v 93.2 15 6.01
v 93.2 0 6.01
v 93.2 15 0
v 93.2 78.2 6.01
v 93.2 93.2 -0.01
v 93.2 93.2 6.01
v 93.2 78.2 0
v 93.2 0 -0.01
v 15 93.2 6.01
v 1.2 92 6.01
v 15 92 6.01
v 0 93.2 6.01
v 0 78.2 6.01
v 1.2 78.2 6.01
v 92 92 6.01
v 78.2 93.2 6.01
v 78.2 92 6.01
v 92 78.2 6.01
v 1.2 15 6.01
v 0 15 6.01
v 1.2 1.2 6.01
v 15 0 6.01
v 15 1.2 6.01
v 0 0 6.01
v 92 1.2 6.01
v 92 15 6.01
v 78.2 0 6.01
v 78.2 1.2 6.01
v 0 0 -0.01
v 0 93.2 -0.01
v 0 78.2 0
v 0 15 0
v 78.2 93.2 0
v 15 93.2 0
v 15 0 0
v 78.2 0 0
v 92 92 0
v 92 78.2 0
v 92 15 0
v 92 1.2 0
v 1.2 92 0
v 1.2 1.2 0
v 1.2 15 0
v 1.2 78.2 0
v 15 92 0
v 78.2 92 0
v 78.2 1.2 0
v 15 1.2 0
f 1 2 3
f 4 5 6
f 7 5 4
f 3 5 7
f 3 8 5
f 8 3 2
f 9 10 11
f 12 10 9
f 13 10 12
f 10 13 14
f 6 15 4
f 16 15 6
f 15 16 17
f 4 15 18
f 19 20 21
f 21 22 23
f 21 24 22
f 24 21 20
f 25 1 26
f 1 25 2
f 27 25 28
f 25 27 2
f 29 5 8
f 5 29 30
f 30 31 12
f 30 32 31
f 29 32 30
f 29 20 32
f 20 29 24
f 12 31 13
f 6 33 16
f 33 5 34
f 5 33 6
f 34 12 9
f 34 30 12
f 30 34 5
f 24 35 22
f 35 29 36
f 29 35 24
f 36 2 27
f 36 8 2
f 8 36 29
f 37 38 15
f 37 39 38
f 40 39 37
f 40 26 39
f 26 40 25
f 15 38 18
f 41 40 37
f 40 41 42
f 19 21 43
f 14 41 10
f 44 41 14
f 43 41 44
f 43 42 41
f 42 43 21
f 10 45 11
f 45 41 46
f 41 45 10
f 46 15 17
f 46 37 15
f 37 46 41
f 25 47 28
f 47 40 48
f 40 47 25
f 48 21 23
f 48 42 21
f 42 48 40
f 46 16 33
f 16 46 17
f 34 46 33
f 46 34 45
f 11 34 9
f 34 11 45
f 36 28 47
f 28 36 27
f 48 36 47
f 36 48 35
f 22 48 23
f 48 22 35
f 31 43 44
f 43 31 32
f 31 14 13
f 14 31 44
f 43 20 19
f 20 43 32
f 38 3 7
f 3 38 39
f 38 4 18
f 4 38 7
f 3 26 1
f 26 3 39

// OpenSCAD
// file: ../Base/Boxes.scad
// Fischertechnik Box Foundation
// Pre-designed Boxes

use <Constants.scad>

include <PlacementOptions.scad>

box190Width = 190;
box190Depth = 130;
box130Width = 130;
box130Depth = 95;

// Values are from an original ec3 box
topBottomDifference = 1.5;
outerHeight = 40;
baseThickness = 1.8;
innerHeight = outerHeight - baseThickness;
stackExcess = 5.7;
radius = 3.5;
wallThickness = 1.5;
tolerance = 0.2;

boxWallThickness = wallThickness;
boxBaseThickness = baseThickness;
boxWebWidth = 3.0;

// getBoxWallThickness()
// Gets the wall thickness of a Fischertechnik Box
function getBoxWallThickness() = boxWallThickness;

// getBoxUsageHeight(height = 38.2)
// Gets the usable height of a Fischertechnik box
// height = Outer height of the box from the bottom to the upper edge.
function getBoxUsageHeight(height = outerHeight) = height - baseThickness - stackExcess;

// getBoxInnerHeight()
// Gets the inner height of a Fischertechnik box, including the stack excess
function getBoxInnerHeight() = innerHeight;

// getBoxBaseThickness()
// Gets the thickness of the Fischertechnik box base.
function getBoxBaseThickness() = boxBaseThickness;

// getBoxWebWidth()
// Gets the width of a box web
function getBoxWebWidth() = boxWebWidth;

// getBox190Space()
// Gets the usable inner space of a Box 190 as an x/y-list
function getBox190Space() = [
    box190Width - 2*getBoxWallThickness() - topBottomDifference, 
    box190Depth - 2*getBoxWallThickness() - topBottomDifference ];

// RoundedCornerPlate(width, depth, height, radius)
// Creates a body plate with rounded corners for a box. Used
// also to create the complete box with the hull module.
// width = Width of the plate
// depth = depth of the plate 
// height = thickness of the plate
// radius = radius of the rounded corner
module RoundedCornerPlate(width, depth, height, radius) {
    translate([radius, radius])
    hull() {
        w = width-2*radius;
        d = depth-2*radius;
        cube([w, d, height]);
        cylinder(height, r=radius, $fn=getFragments());
        translate([w, 0])
            cylinder(height, r=radius, $fn=getFragments());
        translate([w, d])
            cylinder(height, r=radius, $fn=getFragments());
        translate([0, d])
            cylinder(height, r=radius, $fn=getFragments());
    }
}

// BoxBase(width, depth)
// Creates an empty stackable Fischertechnik compatible box
// width = Outer width of the box (190, 130, ...)
// depth = Outer depth of the box (130, 95, ...)

module BoxBase(width, depth, height=outerHeight) {    
    thinPlate = 0.01;

    innerHeight = height - baseThickness;    
    
    module Body(tolerance=tolerance) {
        hull() {
            // Bottom with tolerance to fit into the original boxes when stacked
            translate([-wallThickness+tolerance, -wallThickness+tolerance, -baseThickness])
                RoundedCornerPlate(width-topBottomDifference-2*tolerance, depth-topBottomDifference-2*tolerance, thinPlate, radius);
            
            // Top
            translate([-wallThickness-topBottomDifference/2, -wallThickness-topBottomDifference/2, innerHeight-thinPlate])
                RoundedCornerPlate(width, depth, thinPlate, radius);
         }
    }

    module Cutoff() {
        hull() {
            coWidth = width - 2*wallThickness;
            coDepth = depth - 2*wallThickness;
            
            // Bottom
            RoundedCornerPlate(coWidth-topBottomDifference, coDepth-topBottomDifference, thinPlate, radius);

            // Top
            translate([-topBottomDifference/2, -topBottomDifference/2, innerHeight+thinPlate]) 
                RoundedCornerPlate(coWidth, coDepth, thinPlate, radius);
        }
    }
    
    difference() {        
        Body();
        Cutoff();
        stackOffset = innerHeight - stackExcess;
        translate([0, 0, stackOffset + baseThickness])
            Body(tolerance=0);
    }
}

// Creates the Fischertechnik empty box 130x190 mm and places it at position 0,0
// 190x130 are the outer sizes, the inner space is slightly smaller. Use getBox190Space() to get the inner sizes.
// The box is positioned that the usable inner space is at the 0,0,0 position.

module Box190() {
    BoxBase(box190Width, box190Depth);
}

// Gets the usable inner space of a Box 130 as an x/y-list
function getBox130Space() = [
    box130Width - 2*getBoxWallThickness() - topBottomDifference, 
    box130Depth - 2*getBoxWallThickness() - topBottomDifference ];

// Creates the Fischertechnik empty box 95x130 mm and places it at position 0,0
// 190x130 are the outer sizes, the inner space is slightly smaller. Use getBox190Space() to get the inner sizes.
// The box is positioned that the usable inner space is at the 0,0,0 position.

module Box130() {
    BoxBase(box130Width, box130Depth);
}

// Creates a web at the specified box walls
// corner 0 = LowerLeft, 1 = UpperLeft, 2 = UpperRight, 3 = LowerRight
// side 0 = LeftOfCorner, 1 = RightOfCorner
// distance = Distance in mm from the corner
// boxSpace = inner width and depth of the box (default: Box 190)
// webWidth = length of the web (default is 3 mms)
// webThickness = thickness of the web (default is 1 mm)
// height = Height of the web (standard is getBoxUsageHeight())

module BoxWeb(corner, side, distance, boxSpace=getBox190Space(), webWidth=getBoxWebWidth(), webThickness=1.0, height=getBoxUsageHeight()) {
    sink = getBoxWallThickness()/2;

    width = (corner % 2 == 0) ? 
            (side == LeftOfCorner ? webWidth : webThickness) :
            (side == LeftOfCorner ? webThickness : webWidth);

    depth = (corner % 2 == 0) ? 
            (side == RightOfCorner ? webWidth : webThickness) :
            (side == RightOfCorner ? webThickness : webWidth);
    
    xDiff = corner == LowerLeft ? 
                (side == LeftOfCorner ? -sink : distance) :
            (corner == UpperLeft ?                
                (side == LeftOfCorner ? distance : -sink) :
            (corner == UpperRight ?
                (side == LeftOfCorner ? boxSpace.x-webWidth+sink : boxSpace.x-distance-webThickness) :
                (side == LeftOfCorner ? boxSpace.x-distance-webThickness: boxSpace.x-webWidth+sink)));

    yDiff = corner == LowerLeft ? 
                (side == RightOfCorner ? -sink : distance) :
            (corner == UpperLeft ?
                (side == RightOfCorner ? boxSpace.y-distance-webThickness : boxSpace.y-webWidth+sink) :
            (corner == UpperRight ?
                (side == RightOfCorner ? boxSpace.y-webWidth+sink : boxSpace.y-distance-webThickness) :
                (side == RightOfCorner ? distance : -sink)));
    
    translate([xDiff, yDiff, -getExcess()])
        cube([width, depth, height + 2*getExcess()]);
}
// file: ../Base/Rotation.scad
// Fischertechnik Box Foundation
// Geometry Helpers Rotation

include <PlacementOptions.scad>

// getRotatedSpace(space, rotation=NoRotation)
// Rotates the space dependent on the specified rotation

function getRotatedSpace(space, rotation=NoRotation) = [
    (rotation == Rotate90 || rotation == Rotate270) ? space.y : space.x,
    (rotation == Rotate90 || rotation == Rotate270) ? space.x : space.y
];

// Rotates the given space around the fixed left lower corner
// space = the space the children needs as width/depth list [width,depth]
// rotation = 0 Rotate0 degrees, 1 Rotate90 degrees, 2 Rotate180 degrees, 3 Rotate270 degrees (equivalent to -90)

module RotateFix(space, rotation=NoRotation) {
    dy = (rotation == Rotate0 || rotation == Rotate270) ? 0 :
        (rotation == Rotate90) ? space.x :
        space.y;
    dx = (rotation < Rotate180) ? 0 :
        (rotation == Rotate180) ? space.x :
        space.y;
    
    translate([dx, dy, 0])
        rotate([0, 0, rotations[rotation]])
            children();
}
// file: ../Base/Alignment.scad
// Fischertechnik Box Foundation
// Geometry Helpers Alignment

include <PlacementOptions.scad>

// getAlignedX(elementWidth, spaceWidth, align=AlignRight, offset=0)
// Gets the aligned X offset of an element with the given
// width in the given space.
// elementWidth = The width of the element to positon
// spaceWidth = The space where the element should be aligned
// align = 0 AlignLeft, 1 AlignCenter, 2 AlignRight
// offset = an optional offset from the aligned position. When
// aligned left or centered, then positive values are in X direction.
// When aligned right then positive values are in negative X direction.

function getAlignedX(elementWidth, spaceWidth, align=AlignRight, offset=0) =
    (align == AlignLeft) ?
        offset :
        ((align == AlignCenter) ?
        (spaceWidth - elementWidth)/2 + offset :
        spaceWidth - offset - elementWidth);

// getAlignedY(elementDepth, spaceDepth, align=AlignTop, offset=0)
// Gets the aligned Y offset of an element with the given
// depth in the given space.
// elementDepth = The depth of the element to positon
// spaceDepth = The space where the element should be aligned
// align = 0 AlignBottom, 1 AlignCenter, 2 AlignTop
// offset = an optional offset from the aligned position. When
// aligned bottom or centered, then positive values are in Y direction.
// When aligned top then positive values are in negative Y direction.

function getAlignedY(elementDepth, spaceDepth, align=AlignTop, offset=0) =
    (align == AlignBottom) ?
        offset :
        ((align == AlignCenter) ?
        (spaceDepth - elementDepth)/2 + offset :
        spaceDepth - offset - elementDepth);
// file: ../Base/Placement.scad
// Fischertechnik Box Foundation
// Geometry Helpers Placement

use <Constants.scad>
use <Alignment.scad>
use <Rotation.scad>
use <Boxes.scad>

include <PlacementOptions.scad>

// Place(x=0, y=0, elementSpace=[0,0], alignX=AlignLeft, alignY=AlignBottom, rotation=Rotate0, boxSpace=getBox190Space())
// Places the child at the specified position
// y = Y-Position. This is a relative position when an X aligment is specified.
// x = X-Position. This is a relative position when an Y aligment is specified.
// elementSpace = space of the element to be placed [x,y]
// alignX = -1=NoAlign, 0 AlignLeft, 1 AlignCenter, 3 AlignRight (elementSpace and boxSpace required!)
// alignY = -1=NoAlign, 2 AlignBottom, 1 AlignCenter, 4 AlignTop (elementSpace and boxSpace required!)
// rotation = 0 Rotate0 0 degrees, 1 Rotate90 90 degrees, 
// 2 Rotate180 180 degrees, 3 Rotate270 270 degrees (equivalent to -90)
// boxSpace = Inner space of the box where the placement occurs [x,y] - default is Box 190x130 inner space

module Place(x=0, y=0, elementSpace=[0,0], 
  alignX=AlignLeft, alignY=AlignBottom, 
  rotation=NoRotation, boxSpace=getBox190Space()) {

    module Position(x, y, space, rotation=Rotate0) {
        translate([x, y, 0])
            RotateFix(space, rotation)
                children();
    }

    space = getRotatedSpace(elementSpace, rotation);
    alignedX = getAlignedX(space.x, boxSpace.x, alignX, x);
    alignedY = getAlignedY(space.y, boxSpace.y, alignY, y);
    Position(alignedX, alignedY, elementSpace, rotation)
        children();
}

// Center(space=getBox130Space(), elementSpace=[0,0])
// space = Space where the children is centered. For cylinder use centered=true and no elementSpace.
// elementSpace = space of the element to be centered [x,y]

module Center(space=getBox190Space(), elementSpace=[0,0]) {
    Place(elementSpace=elementSpace, boxSpace=space, alignX=AlignCenter, alignY=AlignCenter)
        children();
}

// CenterHorizontal(width=0, y=0, offset=0, space=getBox130Space())
// width = Width of the element to be placed.
// y = Y position of the element
// offset = Offset from the center position (negative will be left of the center)
// space = Space where the element is placed

module CenterHorizontal(width=0, y=0, offset=0, space=getBox190Space()) {
    Place(x=offset, y=y, elementSpace=[width, 0], boxSpace=space, alignX=AlignCenter)
        children(0);
}

// CenterVertical(depth=0, x=0, offset=0, space=getBox130Space())
// depth = Depth of the element to be placed.
// x = X position of the element
// offset = Offset from the center position (negative will be down of the center)
// space = Space where the element is placed

module CenterVertical(depth=0, x=0, offset=0, space=getBox190Space()) {
    Place(x=x, y=offset, elementSpace=[0, depth], boxSpace=space, alignY=AlignCenter)
        children(0);
}

// getIsVertical(align)
// True if the specified alignment needs a vertical orientation for a divider (AlignRight, AlignLeft)

function getIsVertical(align) = (align == AlignRight || align == AlignLeft);

// getIsHorizontal(align)
// True if the specified alignment needs a horizontal orientation for a divider (AlignTop, AlignBottom)

function getIsHorizontal(align) = (align == AlignTop || align == AlignBottom);
// file: ../Base/Constants.scad
// Fischertechnik Box Foundation
// Constants

// Constant values necessary for multiple elements

// Base constants
dividerThickness = 1.2;
excess = 0.01;
fragments = 90;
tolerance = 0.8;

// Gets the thickness of a divider 
function getDividerThickness() = dividerThickness;

// Gets the excess that is used to merge walls into each other
function getExcess() = excess;

// Gets amount of fragments of a cylinder
function getFragments() = fragments;

// Gets the inner tolerance of a frame to each side
function getTolerance() = tolerance;


// Fischertechnik specific constants
axisDiameter = 4;
axisBottomDiameter = axisDiameter + 1;
axisTolerance = 0.2;

// Gets axis diameter of Fischertechnik axis
function getAxisDiameter() = axisDiameter;

// Gets axis diameter tolerance (subtracted for element axis)
function getAxisTolerance() = axisTolerance;

// Gets the axis diameter for standing axis
function getStandAxisDiameter() = getAxisDiameter() - getAxisTolerance();

// Gets axis bottom diameter for thicker part at the bottom
function getAxisBottomDiameter() = axisBottomDiameter;

standardEdgeDistance = 2.5;
standardWebDistance = 11.5;
standardCornerLength = 15;

// gets the standard distance to the wall of the box for dockable frames with webs
function getStandardEdgeDistance() = standardEdgeDistance;

// gets the standard distance of each web to the corner of the dockable frame
function getStandardWebDistance() = standardWebDistance;

// gets the standard length of the corner walls of a dockable frame
function getStandardCornerLength() = standardCornerLength;

tubeWallFactor = 0.8;

// gets the wall thickness of a tube.
function getTubeWallThickness() = tubeWallFactor * getDividerThickness();

smallPartsFrameHeight = 20;

// gets the frame height for docked small parts boxes.
function getSmallPartsFrameHeight() = smallPartsFrameHeight;

hubRingDiameter = 19.5;
hubRingLevelDiameter = 21;

// gets the diameter of a tube matching the inner ring of a wheel
function getHubRingDiameter() = hubRingDiameter;

// gets the diameter of a hub tube with a thicker diameter
function getHubRingLevelDiameter() = hubRingLevelDiameter;
// file: ../Base/PlacementOptions.scad
// Fischertechnik Box Foundation
// Placement Options

// Alignment
NoAlign = 0;
AlignLeft = 1;
AlignBottom = 2;
AlignCenter = 3;
AlignRight = 4;
AlignTop = 5;

// Element rotation degree steps
rotations = [0, -90, -180, -270];

// Rotation
NoRotation = 0;
Rotate0 = 0;
Rotate90 = 1;
Rotate180 = 2;
Rotate270 = 3;

// Docking (seen from above)
NoDock = -1;
DockLeft = 0;
DockTop = 1;
DockRight = 2;
DockCorner = 2;
DockBottom = 3;

// Web corners
LowerLeft = 0;
UpperLeft = 1;
UpperRight = 2;
LowerRight = 3;

// Web position relative to corner
LeftOfCorner = 0;
RightOfCorner = 1;
// main file
// Fischertechnik Box Library
// Frame for TX/TXT controller
// 153513, 173067, 500995, 

use <../ModelBase/Complex.scad>

include <../Base/PlacementOptions.scad>

width = 90;
depth = 90;
height = 6;

// getFrameTXTControllerSpace(alignX, alignY)
// alignX 0=NoAlign 1=AlignLeft 3=AlignCenter 4=AlignRight 
// alignY 0=AlignNo 2=AlignBottom 3=AlignCenter 5=AlignTop
// Gets the space the frame for a TXT Controller needs as width and depth(.x and .y as a list). 

function getFrameTXTControllerSpace(alignX=NoAlign, alignY=NoAlign) = 
    getDockableEdgedFrameSpace([width, depth, height], alignX, alignY);

// FrameTXTController(alignX, alignY)
// Frame for TXT controller.
// alignX 0=NoAlign 1=AlignLeft 3=AlignCenter 4=AlignRight 
// alignY 0=AlignNo 2=AlignBottom 3=AlignCenter 5=AlignTop

module FrameTXTController(alignX=NoAlign, alignY=NoAlign) {
    DockableEdgedFrame([width, depth, height], alignX, alignY);
}

// Test
color("lightgray") {
    FrameTXTController();
}
